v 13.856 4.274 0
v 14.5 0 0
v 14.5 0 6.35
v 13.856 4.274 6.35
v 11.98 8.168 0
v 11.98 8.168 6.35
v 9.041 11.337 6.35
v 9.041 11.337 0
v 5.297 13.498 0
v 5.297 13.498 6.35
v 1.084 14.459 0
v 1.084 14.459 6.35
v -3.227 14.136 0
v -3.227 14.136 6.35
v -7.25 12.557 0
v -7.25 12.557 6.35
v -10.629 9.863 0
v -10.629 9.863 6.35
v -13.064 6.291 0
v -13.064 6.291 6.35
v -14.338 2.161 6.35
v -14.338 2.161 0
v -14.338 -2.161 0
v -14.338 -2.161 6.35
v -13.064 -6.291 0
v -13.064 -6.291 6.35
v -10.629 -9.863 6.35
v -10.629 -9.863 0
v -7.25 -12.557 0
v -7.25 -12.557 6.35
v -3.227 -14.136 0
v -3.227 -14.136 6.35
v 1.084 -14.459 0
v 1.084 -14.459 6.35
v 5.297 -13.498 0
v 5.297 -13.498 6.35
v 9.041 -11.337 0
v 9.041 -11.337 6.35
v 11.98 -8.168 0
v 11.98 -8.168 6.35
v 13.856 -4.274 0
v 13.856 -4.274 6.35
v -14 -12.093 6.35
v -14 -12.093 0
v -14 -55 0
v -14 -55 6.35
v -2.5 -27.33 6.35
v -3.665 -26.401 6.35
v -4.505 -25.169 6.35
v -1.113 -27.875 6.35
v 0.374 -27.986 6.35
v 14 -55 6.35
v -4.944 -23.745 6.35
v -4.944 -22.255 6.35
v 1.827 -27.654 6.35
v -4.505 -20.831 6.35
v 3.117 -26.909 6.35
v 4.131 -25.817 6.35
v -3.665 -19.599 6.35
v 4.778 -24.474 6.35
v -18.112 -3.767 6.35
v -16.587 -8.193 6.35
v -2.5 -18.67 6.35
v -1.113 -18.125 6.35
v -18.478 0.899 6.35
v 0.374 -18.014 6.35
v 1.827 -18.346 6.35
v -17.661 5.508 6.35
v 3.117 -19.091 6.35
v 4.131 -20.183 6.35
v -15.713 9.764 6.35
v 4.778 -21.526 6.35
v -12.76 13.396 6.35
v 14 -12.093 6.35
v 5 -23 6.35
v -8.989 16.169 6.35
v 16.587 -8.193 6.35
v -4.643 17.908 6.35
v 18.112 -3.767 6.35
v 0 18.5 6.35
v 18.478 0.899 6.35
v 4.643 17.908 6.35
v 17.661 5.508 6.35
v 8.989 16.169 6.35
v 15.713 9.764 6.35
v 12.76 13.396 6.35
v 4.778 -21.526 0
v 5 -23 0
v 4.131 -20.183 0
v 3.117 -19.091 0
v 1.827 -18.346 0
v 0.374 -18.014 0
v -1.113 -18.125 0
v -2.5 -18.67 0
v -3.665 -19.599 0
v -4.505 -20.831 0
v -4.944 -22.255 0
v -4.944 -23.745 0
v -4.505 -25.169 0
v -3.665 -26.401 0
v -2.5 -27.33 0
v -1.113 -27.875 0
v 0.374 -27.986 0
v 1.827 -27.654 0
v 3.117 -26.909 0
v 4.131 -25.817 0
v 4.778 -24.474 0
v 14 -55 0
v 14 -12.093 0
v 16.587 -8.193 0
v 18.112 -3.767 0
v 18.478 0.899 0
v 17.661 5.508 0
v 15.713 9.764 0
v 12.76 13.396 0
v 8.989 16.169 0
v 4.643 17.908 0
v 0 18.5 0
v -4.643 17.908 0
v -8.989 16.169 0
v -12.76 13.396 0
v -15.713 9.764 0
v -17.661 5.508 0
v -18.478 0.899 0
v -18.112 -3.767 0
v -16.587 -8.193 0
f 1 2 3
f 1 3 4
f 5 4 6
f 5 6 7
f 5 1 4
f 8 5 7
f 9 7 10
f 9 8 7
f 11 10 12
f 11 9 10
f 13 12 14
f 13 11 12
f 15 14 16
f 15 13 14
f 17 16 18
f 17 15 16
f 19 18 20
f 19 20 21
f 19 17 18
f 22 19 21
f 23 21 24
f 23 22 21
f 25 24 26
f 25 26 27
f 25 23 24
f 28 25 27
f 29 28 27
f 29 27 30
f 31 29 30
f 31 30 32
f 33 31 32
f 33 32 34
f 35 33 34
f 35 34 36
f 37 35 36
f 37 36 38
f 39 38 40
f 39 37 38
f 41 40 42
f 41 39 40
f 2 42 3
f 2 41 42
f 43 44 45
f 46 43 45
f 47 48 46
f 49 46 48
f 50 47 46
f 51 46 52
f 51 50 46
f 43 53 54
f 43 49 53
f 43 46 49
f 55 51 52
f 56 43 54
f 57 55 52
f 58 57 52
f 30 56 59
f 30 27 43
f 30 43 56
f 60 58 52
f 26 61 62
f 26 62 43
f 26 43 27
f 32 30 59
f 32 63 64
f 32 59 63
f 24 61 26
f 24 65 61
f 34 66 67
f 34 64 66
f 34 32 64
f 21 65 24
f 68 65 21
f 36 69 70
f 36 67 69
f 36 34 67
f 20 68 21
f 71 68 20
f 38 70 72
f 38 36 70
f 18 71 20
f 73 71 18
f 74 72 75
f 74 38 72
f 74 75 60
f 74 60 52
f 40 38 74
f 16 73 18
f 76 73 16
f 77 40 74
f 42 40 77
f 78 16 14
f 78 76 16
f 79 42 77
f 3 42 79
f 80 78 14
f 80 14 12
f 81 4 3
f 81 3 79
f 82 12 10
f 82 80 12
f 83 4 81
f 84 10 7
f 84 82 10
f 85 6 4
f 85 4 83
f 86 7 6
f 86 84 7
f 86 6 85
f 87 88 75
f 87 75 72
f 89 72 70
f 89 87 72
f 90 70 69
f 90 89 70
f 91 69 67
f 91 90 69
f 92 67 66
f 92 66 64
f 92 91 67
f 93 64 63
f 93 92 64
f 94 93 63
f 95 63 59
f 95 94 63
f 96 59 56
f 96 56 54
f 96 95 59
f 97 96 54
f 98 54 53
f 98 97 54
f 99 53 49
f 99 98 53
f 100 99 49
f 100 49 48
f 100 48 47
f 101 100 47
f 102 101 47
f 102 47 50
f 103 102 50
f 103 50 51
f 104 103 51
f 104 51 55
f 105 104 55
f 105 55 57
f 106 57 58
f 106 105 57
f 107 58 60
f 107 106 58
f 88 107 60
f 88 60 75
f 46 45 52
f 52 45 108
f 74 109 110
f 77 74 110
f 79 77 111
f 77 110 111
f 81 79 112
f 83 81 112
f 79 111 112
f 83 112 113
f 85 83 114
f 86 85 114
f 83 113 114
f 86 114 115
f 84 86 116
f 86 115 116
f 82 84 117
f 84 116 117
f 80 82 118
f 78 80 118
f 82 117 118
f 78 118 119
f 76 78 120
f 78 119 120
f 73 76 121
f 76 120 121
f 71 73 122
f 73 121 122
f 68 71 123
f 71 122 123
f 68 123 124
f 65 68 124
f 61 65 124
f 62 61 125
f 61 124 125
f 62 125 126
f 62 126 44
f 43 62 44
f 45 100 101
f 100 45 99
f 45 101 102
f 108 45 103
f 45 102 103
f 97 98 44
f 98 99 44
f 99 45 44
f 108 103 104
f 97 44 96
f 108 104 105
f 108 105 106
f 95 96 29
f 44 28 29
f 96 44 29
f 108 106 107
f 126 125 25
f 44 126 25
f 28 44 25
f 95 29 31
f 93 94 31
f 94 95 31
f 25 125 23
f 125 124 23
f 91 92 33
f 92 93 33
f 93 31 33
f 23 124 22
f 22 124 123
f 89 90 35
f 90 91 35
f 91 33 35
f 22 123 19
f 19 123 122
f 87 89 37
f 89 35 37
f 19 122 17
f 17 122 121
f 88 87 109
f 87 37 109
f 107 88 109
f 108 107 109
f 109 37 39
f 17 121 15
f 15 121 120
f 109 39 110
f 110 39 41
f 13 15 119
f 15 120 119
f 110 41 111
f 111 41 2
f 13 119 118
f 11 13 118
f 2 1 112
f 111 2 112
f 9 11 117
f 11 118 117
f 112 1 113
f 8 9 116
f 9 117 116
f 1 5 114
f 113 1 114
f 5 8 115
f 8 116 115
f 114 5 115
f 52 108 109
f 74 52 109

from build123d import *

# Parameters (mm, degrees)
SKETCH1_R           = 14.5
SKETCH1_R_2         = 5
BOSS_EXTRUDE1_DEPTH = 6.35


with BuildPart() as part:
    # Sketch1 → Boss-Extrude1 (new body)
    with BuildSketch(Plane.XY):
        with BuildLine():
            Line((-14, -55), (14, -55))
            Line((14, -55), (14, -12.093386622))
            ThreePointArc((14, -12.093386622), (0, 18.5), (-14, -12.093386622))
            Line((-14, -12.093386622), (-14, -55))
        make_face()
        Circle(SKETCH1_R, mode=Mode.SUBTRACT)
        with Locations((0, -23)):
            Circle(SKETCH1_R_2, mode=Mode.SUBTRACT)
    extrude(amount=BOSS_EXTRUDE1_DEPTH)


solid = part.part
